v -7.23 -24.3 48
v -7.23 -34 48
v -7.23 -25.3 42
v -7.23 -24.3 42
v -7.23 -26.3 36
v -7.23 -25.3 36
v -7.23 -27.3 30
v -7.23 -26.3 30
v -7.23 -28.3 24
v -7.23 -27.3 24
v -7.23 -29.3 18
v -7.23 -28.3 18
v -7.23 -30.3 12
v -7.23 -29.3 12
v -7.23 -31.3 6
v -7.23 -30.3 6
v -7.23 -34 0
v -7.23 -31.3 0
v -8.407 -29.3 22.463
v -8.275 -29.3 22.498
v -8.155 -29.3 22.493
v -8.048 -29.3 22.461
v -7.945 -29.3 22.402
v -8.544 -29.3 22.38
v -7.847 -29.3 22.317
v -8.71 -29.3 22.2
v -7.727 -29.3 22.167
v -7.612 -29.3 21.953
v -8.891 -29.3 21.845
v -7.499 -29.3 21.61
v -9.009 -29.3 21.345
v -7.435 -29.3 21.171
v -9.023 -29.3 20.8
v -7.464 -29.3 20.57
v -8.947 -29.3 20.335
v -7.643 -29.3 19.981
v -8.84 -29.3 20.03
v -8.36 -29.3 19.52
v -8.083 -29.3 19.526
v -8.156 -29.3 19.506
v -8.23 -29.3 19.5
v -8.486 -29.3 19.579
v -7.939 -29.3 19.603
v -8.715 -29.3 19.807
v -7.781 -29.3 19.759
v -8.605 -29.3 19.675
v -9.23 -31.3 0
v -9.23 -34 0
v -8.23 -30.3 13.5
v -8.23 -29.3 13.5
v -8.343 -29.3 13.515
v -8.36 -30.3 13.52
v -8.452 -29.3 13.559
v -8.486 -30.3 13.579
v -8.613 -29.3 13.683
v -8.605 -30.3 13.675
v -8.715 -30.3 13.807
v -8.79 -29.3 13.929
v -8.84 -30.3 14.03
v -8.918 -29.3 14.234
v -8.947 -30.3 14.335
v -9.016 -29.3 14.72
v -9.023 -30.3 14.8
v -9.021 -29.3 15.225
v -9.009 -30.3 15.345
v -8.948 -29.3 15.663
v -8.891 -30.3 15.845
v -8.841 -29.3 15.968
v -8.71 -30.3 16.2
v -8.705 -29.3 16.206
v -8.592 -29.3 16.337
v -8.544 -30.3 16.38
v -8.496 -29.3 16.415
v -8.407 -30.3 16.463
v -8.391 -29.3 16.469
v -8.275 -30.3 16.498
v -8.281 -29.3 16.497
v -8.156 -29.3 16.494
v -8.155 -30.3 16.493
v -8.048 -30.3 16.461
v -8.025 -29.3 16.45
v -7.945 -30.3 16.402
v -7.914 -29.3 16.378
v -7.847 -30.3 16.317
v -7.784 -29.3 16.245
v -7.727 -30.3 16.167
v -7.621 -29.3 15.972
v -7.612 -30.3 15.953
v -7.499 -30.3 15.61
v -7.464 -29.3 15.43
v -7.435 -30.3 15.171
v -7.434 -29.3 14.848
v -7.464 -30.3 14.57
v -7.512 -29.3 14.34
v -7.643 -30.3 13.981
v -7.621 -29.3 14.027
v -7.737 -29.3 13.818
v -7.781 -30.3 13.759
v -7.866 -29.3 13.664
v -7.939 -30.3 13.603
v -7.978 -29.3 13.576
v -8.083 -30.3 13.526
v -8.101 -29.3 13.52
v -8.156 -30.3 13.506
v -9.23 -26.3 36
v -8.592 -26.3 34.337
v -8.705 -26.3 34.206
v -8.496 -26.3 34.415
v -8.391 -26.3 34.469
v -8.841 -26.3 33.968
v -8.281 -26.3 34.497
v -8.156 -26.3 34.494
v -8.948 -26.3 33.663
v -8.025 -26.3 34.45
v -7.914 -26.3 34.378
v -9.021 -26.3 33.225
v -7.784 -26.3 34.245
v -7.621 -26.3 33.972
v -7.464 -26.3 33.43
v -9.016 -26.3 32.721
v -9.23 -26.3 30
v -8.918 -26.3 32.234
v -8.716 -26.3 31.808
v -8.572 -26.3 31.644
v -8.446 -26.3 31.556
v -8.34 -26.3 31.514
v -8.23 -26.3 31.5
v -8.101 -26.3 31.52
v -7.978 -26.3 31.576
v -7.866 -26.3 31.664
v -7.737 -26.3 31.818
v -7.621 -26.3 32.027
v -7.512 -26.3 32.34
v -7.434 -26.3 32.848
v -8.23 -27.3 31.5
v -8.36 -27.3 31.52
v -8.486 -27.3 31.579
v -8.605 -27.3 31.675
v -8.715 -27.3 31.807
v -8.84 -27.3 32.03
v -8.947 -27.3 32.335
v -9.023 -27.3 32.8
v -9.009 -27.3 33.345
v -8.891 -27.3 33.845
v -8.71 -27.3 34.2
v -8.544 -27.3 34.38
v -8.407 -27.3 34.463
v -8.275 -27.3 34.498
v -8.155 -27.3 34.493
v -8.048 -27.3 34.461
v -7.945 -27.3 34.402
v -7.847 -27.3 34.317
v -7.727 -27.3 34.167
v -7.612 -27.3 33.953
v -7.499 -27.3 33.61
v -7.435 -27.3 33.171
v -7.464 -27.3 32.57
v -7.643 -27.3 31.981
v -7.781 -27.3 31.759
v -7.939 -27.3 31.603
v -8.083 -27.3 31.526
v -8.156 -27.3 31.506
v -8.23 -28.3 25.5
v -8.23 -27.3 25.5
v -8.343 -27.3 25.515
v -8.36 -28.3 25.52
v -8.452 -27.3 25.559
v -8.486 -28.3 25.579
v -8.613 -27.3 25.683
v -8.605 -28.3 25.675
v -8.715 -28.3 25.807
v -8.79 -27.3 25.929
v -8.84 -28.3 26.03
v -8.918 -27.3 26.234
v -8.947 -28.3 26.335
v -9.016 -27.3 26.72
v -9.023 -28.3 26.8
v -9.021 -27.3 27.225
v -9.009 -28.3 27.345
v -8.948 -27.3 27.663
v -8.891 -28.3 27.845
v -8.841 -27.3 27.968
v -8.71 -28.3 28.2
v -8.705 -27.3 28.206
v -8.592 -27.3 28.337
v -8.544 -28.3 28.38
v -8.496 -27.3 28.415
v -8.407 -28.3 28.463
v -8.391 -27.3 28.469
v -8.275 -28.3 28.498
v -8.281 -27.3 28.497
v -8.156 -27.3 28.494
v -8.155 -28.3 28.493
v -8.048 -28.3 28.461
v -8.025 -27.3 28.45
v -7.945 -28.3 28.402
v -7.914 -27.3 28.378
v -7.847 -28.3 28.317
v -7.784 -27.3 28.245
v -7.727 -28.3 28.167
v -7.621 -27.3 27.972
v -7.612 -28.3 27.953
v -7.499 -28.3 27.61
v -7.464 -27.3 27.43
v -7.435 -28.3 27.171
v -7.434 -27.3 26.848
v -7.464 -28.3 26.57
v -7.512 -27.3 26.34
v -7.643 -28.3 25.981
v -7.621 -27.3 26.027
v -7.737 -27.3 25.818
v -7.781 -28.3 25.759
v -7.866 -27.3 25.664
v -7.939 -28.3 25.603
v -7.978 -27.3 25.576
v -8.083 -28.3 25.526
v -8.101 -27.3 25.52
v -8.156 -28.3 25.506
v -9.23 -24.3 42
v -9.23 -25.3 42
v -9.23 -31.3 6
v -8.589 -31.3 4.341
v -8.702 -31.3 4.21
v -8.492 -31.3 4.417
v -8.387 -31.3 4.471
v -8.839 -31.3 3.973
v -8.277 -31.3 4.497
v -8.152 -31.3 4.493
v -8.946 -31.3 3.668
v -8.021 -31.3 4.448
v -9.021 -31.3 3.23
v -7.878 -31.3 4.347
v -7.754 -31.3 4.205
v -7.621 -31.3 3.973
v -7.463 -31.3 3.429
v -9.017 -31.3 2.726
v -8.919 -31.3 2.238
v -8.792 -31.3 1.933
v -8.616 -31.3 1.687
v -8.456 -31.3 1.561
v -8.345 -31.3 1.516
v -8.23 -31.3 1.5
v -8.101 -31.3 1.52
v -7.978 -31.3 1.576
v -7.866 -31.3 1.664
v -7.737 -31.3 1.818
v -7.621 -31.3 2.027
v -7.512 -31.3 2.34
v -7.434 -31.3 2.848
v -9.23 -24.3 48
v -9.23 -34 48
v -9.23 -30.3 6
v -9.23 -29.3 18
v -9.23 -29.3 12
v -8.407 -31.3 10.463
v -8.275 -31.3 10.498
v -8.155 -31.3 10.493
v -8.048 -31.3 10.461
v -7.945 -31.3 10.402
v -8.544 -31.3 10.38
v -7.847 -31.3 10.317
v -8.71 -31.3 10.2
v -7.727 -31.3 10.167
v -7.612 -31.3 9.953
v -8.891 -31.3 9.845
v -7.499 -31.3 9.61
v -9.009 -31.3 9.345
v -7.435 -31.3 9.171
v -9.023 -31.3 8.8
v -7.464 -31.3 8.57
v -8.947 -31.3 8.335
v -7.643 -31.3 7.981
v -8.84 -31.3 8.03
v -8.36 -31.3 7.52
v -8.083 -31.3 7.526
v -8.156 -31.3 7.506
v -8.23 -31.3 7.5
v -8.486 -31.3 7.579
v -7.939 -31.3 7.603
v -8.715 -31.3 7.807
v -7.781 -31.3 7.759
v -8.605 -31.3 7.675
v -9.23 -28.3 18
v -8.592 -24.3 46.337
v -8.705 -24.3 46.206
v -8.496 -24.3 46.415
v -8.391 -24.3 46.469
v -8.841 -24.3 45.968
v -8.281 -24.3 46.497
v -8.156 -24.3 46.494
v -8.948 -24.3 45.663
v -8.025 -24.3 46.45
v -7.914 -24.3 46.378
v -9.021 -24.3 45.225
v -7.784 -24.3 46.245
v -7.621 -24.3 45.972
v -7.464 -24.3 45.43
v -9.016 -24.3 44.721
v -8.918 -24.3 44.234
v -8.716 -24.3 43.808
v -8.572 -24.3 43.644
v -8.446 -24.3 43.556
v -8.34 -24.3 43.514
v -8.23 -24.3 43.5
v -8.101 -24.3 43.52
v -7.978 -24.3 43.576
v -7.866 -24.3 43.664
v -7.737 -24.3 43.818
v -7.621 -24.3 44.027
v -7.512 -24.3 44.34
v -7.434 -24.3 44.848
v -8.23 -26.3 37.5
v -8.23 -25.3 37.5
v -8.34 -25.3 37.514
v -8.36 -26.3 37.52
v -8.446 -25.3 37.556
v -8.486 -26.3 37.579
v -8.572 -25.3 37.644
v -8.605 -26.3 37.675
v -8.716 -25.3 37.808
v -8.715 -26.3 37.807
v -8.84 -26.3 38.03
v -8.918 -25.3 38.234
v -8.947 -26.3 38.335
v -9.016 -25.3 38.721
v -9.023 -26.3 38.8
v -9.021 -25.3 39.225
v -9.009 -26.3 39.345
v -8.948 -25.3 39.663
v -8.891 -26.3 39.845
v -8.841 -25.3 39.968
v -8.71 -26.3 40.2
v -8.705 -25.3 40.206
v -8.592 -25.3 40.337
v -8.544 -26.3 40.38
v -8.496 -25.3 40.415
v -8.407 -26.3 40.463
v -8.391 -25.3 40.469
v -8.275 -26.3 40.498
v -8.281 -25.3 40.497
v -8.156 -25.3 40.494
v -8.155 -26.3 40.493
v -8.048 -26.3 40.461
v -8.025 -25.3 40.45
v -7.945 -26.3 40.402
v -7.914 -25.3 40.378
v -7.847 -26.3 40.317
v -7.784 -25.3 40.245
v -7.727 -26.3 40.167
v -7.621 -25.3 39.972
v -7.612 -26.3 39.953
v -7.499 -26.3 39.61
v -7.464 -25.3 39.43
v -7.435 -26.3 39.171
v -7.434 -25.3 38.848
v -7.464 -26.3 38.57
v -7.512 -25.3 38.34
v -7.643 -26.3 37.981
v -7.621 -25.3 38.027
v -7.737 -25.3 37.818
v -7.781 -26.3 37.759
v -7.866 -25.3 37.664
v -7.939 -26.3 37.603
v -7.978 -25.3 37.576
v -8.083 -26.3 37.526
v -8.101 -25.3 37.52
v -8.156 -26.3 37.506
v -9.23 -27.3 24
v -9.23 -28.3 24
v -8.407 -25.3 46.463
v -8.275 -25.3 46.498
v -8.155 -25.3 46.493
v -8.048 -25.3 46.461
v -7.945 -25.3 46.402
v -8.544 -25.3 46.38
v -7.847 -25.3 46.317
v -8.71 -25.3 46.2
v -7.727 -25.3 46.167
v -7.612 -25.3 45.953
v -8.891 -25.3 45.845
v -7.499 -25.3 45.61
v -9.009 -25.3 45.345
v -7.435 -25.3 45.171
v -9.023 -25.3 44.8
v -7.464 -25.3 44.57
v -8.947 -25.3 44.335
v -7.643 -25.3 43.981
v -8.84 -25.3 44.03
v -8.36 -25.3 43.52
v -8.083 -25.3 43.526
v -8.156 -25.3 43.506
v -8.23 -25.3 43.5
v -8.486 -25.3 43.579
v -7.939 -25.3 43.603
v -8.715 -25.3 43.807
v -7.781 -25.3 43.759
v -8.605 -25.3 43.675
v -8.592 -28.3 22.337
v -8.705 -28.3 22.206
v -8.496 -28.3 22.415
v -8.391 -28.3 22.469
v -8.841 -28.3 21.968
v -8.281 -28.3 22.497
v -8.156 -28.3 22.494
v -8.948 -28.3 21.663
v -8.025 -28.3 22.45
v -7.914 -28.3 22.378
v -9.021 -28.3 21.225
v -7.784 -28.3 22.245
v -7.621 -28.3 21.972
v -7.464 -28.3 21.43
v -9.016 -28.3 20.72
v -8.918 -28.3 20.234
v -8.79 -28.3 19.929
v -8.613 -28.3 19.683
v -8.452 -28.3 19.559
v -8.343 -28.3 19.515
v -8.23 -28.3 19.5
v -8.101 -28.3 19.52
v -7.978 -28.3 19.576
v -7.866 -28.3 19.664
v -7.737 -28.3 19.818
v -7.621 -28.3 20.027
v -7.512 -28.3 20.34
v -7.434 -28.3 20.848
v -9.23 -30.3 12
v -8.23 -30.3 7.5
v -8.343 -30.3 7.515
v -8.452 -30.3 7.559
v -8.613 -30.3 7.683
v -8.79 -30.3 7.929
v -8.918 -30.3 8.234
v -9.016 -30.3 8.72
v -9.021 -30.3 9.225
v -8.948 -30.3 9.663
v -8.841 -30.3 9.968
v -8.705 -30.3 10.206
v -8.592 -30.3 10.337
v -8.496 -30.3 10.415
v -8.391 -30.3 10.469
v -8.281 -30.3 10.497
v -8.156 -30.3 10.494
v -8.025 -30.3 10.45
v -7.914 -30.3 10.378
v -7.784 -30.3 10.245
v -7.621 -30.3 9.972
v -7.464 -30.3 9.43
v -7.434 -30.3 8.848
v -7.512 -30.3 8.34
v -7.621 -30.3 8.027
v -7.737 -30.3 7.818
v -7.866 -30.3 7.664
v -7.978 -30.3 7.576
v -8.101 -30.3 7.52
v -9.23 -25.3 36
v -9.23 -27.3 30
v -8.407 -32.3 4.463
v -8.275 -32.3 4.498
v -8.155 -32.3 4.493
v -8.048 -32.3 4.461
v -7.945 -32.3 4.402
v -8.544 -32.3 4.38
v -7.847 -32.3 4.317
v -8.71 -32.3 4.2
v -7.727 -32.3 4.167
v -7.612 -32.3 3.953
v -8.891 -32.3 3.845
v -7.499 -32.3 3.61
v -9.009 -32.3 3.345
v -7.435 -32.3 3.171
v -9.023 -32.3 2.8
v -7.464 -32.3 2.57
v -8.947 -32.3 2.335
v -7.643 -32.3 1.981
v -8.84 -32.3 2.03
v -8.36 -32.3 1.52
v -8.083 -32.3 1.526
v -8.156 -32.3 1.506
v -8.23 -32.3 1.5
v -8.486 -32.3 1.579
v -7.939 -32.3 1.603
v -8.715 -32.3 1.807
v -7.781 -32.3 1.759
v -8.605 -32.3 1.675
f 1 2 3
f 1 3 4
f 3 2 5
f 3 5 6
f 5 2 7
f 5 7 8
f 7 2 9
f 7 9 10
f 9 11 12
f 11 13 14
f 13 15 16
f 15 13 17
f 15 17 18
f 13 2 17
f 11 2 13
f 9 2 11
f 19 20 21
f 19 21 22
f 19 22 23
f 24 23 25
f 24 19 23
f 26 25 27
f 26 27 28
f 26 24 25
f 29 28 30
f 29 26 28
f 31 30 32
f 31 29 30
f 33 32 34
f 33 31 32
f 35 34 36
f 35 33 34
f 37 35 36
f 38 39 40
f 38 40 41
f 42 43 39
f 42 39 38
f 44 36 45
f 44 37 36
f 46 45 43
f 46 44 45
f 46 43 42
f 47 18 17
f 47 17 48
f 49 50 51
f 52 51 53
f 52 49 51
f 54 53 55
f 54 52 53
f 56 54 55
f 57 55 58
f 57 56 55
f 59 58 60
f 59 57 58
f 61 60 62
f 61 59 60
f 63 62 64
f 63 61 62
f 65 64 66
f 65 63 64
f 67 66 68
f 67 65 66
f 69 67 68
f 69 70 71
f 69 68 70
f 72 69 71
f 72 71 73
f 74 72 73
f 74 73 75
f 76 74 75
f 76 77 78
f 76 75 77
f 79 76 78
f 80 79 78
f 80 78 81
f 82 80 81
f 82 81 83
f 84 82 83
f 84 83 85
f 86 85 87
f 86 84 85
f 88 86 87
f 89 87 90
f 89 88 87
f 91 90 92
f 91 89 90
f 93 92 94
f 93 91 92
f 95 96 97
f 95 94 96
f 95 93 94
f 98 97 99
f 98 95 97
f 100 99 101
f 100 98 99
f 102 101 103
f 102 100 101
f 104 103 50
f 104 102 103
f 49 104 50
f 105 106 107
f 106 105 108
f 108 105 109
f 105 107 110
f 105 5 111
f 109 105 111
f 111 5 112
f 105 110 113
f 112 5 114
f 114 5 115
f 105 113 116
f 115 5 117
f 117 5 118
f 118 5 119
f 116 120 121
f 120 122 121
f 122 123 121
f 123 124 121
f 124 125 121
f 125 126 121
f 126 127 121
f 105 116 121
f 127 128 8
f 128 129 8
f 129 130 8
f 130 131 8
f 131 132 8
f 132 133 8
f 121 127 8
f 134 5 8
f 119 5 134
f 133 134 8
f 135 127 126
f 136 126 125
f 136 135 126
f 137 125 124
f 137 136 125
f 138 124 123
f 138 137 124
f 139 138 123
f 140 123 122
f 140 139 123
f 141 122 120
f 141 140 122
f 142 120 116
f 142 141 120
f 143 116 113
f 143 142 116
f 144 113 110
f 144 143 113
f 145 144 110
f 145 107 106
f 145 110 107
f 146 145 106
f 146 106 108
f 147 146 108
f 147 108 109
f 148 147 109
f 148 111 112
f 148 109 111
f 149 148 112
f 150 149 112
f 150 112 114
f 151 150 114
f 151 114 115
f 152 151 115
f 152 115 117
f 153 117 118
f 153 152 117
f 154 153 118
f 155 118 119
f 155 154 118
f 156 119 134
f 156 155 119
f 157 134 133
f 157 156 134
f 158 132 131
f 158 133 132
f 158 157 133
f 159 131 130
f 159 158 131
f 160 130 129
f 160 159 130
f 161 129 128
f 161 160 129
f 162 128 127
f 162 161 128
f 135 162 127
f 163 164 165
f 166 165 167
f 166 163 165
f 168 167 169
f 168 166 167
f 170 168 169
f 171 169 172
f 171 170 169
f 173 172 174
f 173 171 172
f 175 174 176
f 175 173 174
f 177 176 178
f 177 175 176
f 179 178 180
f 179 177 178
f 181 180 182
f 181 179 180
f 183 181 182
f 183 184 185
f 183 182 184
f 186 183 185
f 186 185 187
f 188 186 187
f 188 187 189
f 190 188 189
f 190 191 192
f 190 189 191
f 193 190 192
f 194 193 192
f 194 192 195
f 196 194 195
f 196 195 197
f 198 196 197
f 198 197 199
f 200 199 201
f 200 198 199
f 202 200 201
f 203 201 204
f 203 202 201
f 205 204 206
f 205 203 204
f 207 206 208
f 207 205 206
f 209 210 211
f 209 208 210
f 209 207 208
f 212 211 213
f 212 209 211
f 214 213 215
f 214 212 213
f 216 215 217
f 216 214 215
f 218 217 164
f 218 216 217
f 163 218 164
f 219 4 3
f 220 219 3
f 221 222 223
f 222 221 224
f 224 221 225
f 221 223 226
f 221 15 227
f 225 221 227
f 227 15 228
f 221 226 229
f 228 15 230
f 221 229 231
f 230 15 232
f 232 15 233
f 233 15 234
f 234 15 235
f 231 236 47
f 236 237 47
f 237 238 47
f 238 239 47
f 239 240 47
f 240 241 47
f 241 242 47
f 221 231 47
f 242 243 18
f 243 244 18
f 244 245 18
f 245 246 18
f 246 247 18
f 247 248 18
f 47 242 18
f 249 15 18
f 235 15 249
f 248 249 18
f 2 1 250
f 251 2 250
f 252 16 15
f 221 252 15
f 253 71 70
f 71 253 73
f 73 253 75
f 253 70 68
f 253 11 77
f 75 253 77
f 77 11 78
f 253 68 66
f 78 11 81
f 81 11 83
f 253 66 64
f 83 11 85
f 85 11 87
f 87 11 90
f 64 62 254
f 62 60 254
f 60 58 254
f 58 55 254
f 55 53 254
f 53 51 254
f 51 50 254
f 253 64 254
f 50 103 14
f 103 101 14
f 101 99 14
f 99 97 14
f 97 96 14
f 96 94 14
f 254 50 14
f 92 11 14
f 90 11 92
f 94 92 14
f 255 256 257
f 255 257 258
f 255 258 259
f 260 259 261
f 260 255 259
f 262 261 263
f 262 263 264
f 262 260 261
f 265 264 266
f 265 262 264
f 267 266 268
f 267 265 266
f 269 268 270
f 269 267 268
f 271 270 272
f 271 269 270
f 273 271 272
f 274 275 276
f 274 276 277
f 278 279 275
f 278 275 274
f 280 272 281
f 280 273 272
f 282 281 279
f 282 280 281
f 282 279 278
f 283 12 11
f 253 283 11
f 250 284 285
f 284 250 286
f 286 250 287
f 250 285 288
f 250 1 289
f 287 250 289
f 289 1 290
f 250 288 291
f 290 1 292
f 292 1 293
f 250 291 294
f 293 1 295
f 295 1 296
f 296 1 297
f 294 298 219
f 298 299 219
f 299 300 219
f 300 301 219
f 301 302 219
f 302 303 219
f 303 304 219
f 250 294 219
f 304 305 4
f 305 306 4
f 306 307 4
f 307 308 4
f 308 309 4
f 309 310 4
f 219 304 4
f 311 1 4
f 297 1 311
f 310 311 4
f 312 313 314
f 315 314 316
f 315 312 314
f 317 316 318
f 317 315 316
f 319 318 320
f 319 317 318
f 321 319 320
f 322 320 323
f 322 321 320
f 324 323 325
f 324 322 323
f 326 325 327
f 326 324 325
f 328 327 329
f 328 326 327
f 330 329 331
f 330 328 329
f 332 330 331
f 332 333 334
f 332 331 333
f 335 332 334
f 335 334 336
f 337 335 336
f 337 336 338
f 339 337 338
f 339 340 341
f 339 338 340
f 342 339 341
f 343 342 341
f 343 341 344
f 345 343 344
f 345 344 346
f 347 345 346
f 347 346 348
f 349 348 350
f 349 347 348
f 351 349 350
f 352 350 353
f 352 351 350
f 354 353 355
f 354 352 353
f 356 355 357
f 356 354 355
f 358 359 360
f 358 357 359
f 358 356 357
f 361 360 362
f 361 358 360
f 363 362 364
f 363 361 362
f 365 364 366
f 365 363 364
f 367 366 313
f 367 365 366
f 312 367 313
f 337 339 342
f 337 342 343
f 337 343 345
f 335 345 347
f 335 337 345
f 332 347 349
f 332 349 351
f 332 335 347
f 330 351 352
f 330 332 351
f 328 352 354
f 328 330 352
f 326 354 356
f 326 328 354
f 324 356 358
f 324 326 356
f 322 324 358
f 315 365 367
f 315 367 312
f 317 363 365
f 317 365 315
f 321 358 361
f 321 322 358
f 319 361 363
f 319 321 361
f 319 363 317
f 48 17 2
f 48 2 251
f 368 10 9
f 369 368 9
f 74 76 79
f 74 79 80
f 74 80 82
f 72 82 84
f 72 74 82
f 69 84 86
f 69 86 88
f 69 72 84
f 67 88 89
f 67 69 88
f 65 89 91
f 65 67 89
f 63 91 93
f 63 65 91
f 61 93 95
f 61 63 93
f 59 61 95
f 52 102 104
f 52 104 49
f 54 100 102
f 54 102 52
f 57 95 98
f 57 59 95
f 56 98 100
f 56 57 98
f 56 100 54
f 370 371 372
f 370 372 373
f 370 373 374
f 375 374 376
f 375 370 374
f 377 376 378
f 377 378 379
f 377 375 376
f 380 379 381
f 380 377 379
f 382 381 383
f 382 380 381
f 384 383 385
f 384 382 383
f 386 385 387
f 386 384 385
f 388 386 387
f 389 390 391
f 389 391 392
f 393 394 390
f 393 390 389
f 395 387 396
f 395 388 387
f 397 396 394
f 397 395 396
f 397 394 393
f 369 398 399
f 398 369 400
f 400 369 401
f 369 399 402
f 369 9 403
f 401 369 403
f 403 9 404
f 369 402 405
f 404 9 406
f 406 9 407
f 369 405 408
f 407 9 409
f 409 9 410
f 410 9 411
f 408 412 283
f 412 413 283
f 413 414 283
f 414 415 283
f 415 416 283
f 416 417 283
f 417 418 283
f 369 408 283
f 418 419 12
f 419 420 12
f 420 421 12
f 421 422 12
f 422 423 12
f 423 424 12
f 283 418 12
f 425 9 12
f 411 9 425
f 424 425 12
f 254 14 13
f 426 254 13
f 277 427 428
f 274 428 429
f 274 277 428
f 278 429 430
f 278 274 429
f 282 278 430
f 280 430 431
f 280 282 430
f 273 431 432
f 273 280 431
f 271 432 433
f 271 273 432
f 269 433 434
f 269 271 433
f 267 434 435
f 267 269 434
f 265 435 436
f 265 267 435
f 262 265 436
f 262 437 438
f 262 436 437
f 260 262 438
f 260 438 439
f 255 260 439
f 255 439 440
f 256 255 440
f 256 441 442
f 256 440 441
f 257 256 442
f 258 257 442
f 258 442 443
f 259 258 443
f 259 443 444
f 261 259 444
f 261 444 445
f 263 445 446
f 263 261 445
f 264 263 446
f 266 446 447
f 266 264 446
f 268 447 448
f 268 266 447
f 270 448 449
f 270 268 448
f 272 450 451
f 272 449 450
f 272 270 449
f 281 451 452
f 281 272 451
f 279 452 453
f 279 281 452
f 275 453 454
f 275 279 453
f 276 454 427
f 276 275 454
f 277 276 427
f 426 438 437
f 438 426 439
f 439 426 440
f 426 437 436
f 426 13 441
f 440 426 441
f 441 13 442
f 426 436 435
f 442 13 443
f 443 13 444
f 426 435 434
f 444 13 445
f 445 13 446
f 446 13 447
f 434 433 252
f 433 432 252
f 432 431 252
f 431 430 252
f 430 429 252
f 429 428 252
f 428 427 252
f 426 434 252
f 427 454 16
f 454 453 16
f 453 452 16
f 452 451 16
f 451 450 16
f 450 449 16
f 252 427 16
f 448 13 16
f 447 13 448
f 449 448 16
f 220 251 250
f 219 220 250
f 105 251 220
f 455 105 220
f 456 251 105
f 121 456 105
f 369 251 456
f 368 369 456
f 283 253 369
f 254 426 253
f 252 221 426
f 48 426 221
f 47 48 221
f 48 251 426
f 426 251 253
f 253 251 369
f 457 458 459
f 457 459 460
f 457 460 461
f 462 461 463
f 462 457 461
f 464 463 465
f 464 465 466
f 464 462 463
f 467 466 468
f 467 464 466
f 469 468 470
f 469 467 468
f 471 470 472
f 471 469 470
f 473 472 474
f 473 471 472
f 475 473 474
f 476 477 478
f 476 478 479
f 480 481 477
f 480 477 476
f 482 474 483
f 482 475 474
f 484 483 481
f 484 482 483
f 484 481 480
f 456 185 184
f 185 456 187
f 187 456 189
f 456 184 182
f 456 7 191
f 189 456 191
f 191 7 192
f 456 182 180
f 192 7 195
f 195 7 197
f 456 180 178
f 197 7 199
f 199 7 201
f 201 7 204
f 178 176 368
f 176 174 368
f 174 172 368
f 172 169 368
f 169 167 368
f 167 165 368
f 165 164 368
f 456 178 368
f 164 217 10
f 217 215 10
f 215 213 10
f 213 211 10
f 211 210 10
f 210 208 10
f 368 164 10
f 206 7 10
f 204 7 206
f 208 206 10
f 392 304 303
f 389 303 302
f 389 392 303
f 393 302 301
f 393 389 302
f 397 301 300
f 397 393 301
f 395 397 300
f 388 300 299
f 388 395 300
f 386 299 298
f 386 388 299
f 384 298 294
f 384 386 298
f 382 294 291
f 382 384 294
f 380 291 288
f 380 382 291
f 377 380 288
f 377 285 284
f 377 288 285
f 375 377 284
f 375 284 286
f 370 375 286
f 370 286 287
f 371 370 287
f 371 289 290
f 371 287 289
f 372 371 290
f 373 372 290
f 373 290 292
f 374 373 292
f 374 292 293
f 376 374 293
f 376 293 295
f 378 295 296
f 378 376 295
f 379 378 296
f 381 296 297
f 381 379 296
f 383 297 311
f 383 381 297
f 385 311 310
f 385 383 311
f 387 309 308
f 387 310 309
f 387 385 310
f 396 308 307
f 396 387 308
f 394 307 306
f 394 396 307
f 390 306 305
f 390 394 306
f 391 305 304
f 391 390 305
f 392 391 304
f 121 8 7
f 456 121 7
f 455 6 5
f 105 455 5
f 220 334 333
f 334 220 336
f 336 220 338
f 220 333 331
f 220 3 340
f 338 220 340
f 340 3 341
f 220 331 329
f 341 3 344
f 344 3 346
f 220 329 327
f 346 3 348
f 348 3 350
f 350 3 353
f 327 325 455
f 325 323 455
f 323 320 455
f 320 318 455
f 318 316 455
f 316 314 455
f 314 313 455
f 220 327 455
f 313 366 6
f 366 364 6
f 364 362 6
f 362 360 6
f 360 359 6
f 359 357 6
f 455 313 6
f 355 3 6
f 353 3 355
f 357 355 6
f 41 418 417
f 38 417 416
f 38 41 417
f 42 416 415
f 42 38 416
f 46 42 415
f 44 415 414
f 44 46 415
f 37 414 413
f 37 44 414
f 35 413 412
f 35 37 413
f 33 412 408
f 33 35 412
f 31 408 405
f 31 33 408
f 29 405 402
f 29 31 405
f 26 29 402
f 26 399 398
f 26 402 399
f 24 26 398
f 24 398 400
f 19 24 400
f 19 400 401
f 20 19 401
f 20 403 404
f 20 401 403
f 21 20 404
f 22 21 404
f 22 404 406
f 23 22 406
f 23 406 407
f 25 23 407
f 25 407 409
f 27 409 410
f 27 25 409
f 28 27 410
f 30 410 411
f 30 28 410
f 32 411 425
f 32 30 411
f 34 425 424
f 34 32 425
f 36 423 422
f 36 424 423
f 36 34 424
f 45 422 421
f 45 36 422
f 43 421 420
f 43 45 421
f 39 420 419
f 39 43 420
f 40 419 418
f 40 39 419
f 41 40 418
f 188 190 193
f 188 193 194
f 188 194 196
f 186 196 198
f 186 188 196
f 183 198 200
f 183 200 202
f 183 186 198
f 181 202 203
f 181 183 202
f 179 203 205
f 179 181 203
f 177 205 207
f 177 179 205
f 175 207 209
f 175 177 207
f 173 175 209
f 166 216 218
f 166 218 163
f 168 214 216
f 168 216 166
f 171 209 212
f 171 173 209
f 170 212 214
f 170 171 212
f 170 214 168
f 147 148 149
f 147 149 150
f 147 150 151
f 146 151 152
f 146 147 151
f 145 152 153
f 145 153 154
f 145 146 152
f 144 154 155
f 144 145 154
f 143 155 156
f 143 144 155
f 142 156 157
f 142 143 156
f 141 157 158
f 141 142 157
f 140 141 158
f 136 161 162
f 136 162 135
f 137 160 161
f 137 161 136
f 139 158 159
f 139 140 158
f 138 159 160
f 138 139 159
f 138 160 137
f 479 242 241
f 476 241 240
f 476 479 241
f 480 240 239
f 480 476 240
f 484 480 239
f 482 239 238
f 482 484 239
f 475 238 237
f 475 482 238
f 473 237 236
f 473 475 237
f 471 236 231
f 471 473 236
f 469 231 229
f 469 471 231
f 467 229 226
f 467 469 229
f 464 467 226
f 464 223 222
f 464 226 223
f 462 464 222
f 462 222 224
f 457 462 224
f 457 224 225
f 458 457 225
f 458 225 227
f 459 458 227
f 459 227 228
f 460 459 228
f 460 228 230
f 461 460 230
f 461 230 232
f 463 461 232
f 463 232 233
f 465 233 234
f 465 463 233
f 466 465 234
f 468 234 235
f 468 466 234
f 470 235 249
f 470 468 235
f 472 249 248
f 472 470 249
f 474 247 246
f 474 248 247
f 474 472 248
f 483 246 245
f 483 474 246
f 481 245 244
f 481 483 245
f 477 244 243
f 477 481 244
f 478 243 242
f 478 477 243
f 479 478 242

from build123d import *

# Parameters (mm, degrees)
BOSS_EXTRUDE1_DEPTH      = 48
CUT_EXTRUDE4_DEPTH       = 2
CUT_EXTRUDE6_DEPTH       = 9
CUT_EXTRUDE6_DEPTH_BACK  = 1
SKETCH8_RX               = 1.5
SKETCH8_RY               = 0.8
CUT_EXTRUDE7_DEPTH       = 11
CUT_EXTRUDE7_DEPTH_BACK  = 1
SKETCH13_RX              = 1.5
SKETCH13_RY              = 0.8
CUT_EXTRUDE8_DEPTH       = 13
CUT_EXTRUDE8_DEPTH_BACK  = 1
SKETCH14_RX              = 1.5
SKETCH14_RY              = 0.8
CUT_EXTRUDE9_DEPTH       = 15
CUT_EXTRUDE9_DEPTH_BACK  = 1
SKETCH15_RX              = 1.5
SKETCH15_RY              = 0.8
CUT_EXTRUDE10_DEPTH      = 17
CUT_EXTRUDE10_DEPTH_BACK = 1
SKETCH16_RX              = 1.5
SKETCH16_RY              = 0.8
CUT_EXTRUDE11_DEPTH      = 19
CUT_EXTRUDE11_DEPTH_BACK = 1
SKETCH17_RX              = 1.5
SKETCH17_RY              = 0.8
CUT_EXTRUDE12_DEPTH      = 21
CUT_EXTRUDE12_DEPTH_BACK = 1
SKETCH18_RX              = 1.5
SKETCH18_RY              = 0.8
CUT_EXTRUDE13_DEPTH      = 23
CUT_EXTRUDE13_DEPTH_BACK = 1
SKETCH19_RX              = 1.5
SKETCH19_RY              = 0.8
SKETCH20_W               = 61.407499633
SKETCH20_H               = 22.367478321
CUT_EXTRUDE14_DEPTH      = 10


with BuildPart() as part:
    # Sketch2 → Boss-Extrude1 (new body)
    with BuildSketch(Plane.XY):
        Polygon((-7.23, -20.3), (-7.23, -34), (-9.23, -34), (-9.23, -2), (-7.23, -2), align=None)
    extrude(amount=BOSS_EXTRUDE1_DEPTH)

    # Sketch7 → Cut-Extrude4 (cut)
    with BuildSketch(Plane(origin=(-7.23, 0, 0), x_dir=(0, 0, -1), z_dir=(1, 0, 0))):
        Polygon((-48, -16.3), (-48, -24.3), (-42, -24.3), (-42, -25.3), (-36, -25.3), (-36, -26.3), (-30, -26.3), (-30, -27.3), (-24, -27.3), (-24, -28.3), (-18, -28.3), (-18, -29.3), (-12, -29.3), (-12, -30.3), (-6, -30.3), (-6, -31.3), (0, -31.3), (0, -9.3), (-6, -9.3), (-6, -10.3), (-12, -10.3), (-12, -11.3), (-18, -11.3), (-18, -12.3), (-24, -12.3), (-24, -13.3), (-30, -13.3), (-30, -14.3), (-36, -14.3), (-36, -15.3), (-42, -15.3), (-42, -16.3), align=None)
    extrude(amount=-CUT_EXTRUDE4_DEPTH, mode=Mode.SUBTRACT)


with BuildPart() as cut_extrude4_piece_1:
    # of the separate pieces the step leaves, piece 1, a body of its own (cut_extrude4_pieces)
    add(part.part.solids().sort_by_distance((-7.23, -9.3, 0))[0])


with BuildPart() as cut_extrude4_piece_2:
    # of the separate pieces the step leaves, piece 2, a body of its own (cut_extrude4_pieces)
    add(part.part.solids().sort_by_distance((-7.23, -34, 0))[0])


with BuildPart() as cut_extrude6_tool:
    # Sketch8 → Cut-Extrude6 (new, two sides: drawn at the far end of the back side and taken through both)
    with BuildSketch(Plane(origin=(0, -24.3, 0), x_dir=(1, 0, 0), z_dir=(0, 1, 0)).offset(-CUT_EXTRUDE6_DEPTH_BACK)):
        with Locations(Location((-8.23, -45), (0, 0, 90))):
            Ellipse(SKETCH8_RX, SKETCH8_RY)
    extrude(amount=CUT_EXTRUDE6_DEPTH + CUT_EXTRUDE6_DEPTH_BACK)


with BuildPart() as cut_extrude4_piece_1_1:
    add(cut_extrude4_piece_1.part)

    # Cut-Extrude6: cut by cut_extrude6_tool
    add(cut_extrude6_tool.part, mode=Mode.SUBTRACT)


with BuildPart() as cut_extrude4_piece_2_1:
    add(cut_extrude4_piece_2.part)

    # Cut-Extrude6: cut by cut_extrude6_tool
    add(cut_extrude6_tool.part, mode=Mode.SUBTRACT)


with BuildPart() as cut_extrude7_tool:
    # Sketch13 → Cut-Extrude7 (new, two sides: drawn at the far end of the back side and taken through both)
    with BuildSketch(Plane(origin=(0, -25.3, 0), x_dir=(1, 0, 0), z_dir=(0, 1, 0)).offset(-CUT_EXTRUDE7_DEPTH_BACK)):
        with Locations(Location((-8.23, -39), (0, 0, 90))):
            Ellipse(SKETCH13_RX, SKETCH13_RY)
    extrude(amount=CUT_EXTRUDE7_DEPTH + CUT_EXTRUDE7_DEPTH_BACK)


with BuildPart() as cut_extrude4_piece_1_2:
    add(cut_extrude4_piece_1_1.part)

    # Cut-Extrude7: cut by cut_extrude7_tool
    add(cut_extrude7_tool.part, mode=Mode.SUBTRACT)


with BuildPart() as cut_extrude4_piece_2_2:
    add(cut_extrude4_piece_2_1.part)

    # Cut-Extrude7: cut by cut_extrude7_tool
    add(cut_extrude7_tool.part, mode=Mode.SUBTRACT)


with BuildPart() as cut_extrude8_tool:
    # Sketch14 → Cut-Extrude8 (new, two sides: drawn at the far end of the back side and taken through both)
    with BuildSketch(Plane(origin=(0, -26.3, 0), x_dir=(1, 0, 0), z_dir=(0, 1, 0)).offset(-CUT_EXTRUDE8_DEPTH_BACK)):
        with Locations(Location((-8.23, -33), (0, 0, 90))):
            Ellipse(SKETCH14_RX, SKETCH14_RY)
    extrude(amount=CUT_EXTRUDE8_DEPTH + CUT_EXTRUDE8_DEPTH_BACK)


with BuildPart() as cut_extrude4_piece_1_3:
    add(cut_extrude4_piece_1_2.part)

    # Cut-Extrude8: cut by cut_extrude8_tool
    add(cut_extrude8_tool.part, mode=Mode.SUBTRACT)


with BuildPart() as cut_extrude4_piece_2_3:
    add(cut_extrude4_piece_2_2.part)

    # Cut-Extrude8: cut by cut_extrude8_tool
    add(cut_extrude8_tool.part, mode=Mode.SUBTRACT)


with BuildPart() as cut_extrude9_tool:
    # Sketch15 → Cut-Extrude9 (new, two sides: drawn at the far end of the back side and taken through both)
    with BuildSketch(Plane(origin=(0, -27.3, 0), x_dir=(1, 0, 0), z_dir=(0, 1, 0)).offset(-CUT_EXTRUDE9_DEPTH_BACK)):
        with Locations(Location((-8.23, -27), (0, 0, 90))):
            Ellipse(SKETCH15_RX, SKETCH15_RY)
    extrude(amount=CUT_EXTRUDE9_DEPTH + CUT_EXTRUDE9_DEPTH_BACK)


with BuildPart() as cut_extrude4_piece_1_4:
    add(cut_extrude4_piece_1_3.part)

    # Cut-Extrude9: cut by cut_extrude9_tool
    add(cut_extrude9_tool.part, mode=Mode.SUBTRACT)


with BuildPart() as cut_extrude4_piece_2_4:
    add(cut_extrude4_piece_2_3.part)

    # Cut-Extrude9: cut by cut_extrude9_tool
    add(cut_extrude9_tool.part, mode=Mode.SUBTRACT)


with BuildPart() as cut_extrude10_tool:
    # Sketch16 → Cut-Extrude10 (new, two sides: drawn at the far end of the back side and taken through both)
    with BuildSketch(Plane(origin=(0, -28.3, 0), x_dir=(1, 0, 0), z_dir=(0, 1, 0)).offset(-CUT_EXTRUDE10_DEPTH_BACK)):
        with Locations(Location((-8.23, -21), (0, 0, 90))):
            Ellipse(SKETCH16_RX, SKETCH16_RY)
    extrude(amount=CUT_EXTRUDE10_DEPTH + CUT_EXTRUDE10_DEPTH_BACK)


with BuildPart() as cut_extrude4_piece_1_5:
    add(cut_extrude4_piece_1_4.part)

    # Cut-Extrude10: cut by cut_extrude10_tool
    add(cut_extrude10_tool.part, mode=Mode.SUBTRACT)


with BuildPart() as cut_extrude4_piece_2_5:
    add(cut_extrude4_piece_2_4.part)

    # Cut-Extrude10: cut by cut_extrude10_tool
    add(cut_extrude10_tool.part, mode=Mode.SUBTRACT)


with BuildPart() as cut_extrude11_tool:
    # Sketch17 → Cut-Extrude11 (new, two sides: drawn at the far end of the back side and taken through both)
    with BuildSketch(Plane(origin=(0, -29.3, 0), x_dir=(1, 0, 0), z_dir=(0, 1, 0)).offset(-CUT_EXTRUDE11_DEPTH_BACK)):
        with Locations(Location((-8.23, -15), (0, 0, 90))):
            Ellipse(SKETCH17_RX, SKETCH17_RY)
    extrude(amount=CUT_EXTRUDE11_DEPTH + CUT_EXTRUDE11_DEPTH_BACK)


with BuildPart() as cut_extrude4_piece_1_6:
    add(cut_extrude4_piece_1_5.part)

    # Cut-Extrude11: cut by cut_extrude11_tool
    add(cut_extrude11_tool.part, mode=Mode.SUBTRACT)


with BuildPart() as cut_extrude4_piece_2_6:
    add(cut_extrude4_piece_2_5.part)

    # Cut-Extrude11: cut by cut_extrude11_tool
    add(cut_extrude11_tool.part, mode=Mode.SUBTRACT)


with BuildPart() as cut_extrude12_tool:
    # Sketch18 → Cut-Extrude12 (new, two sides: drawn at the far end of the back side and taken through both)
    with BuildSketch(Plane(origin=(0, -30.3, 0), x_dir=(1, 0, 0), z_dir=(0, 1, 0)).offset(-CUT_EXTRUDE12_DEPTH_BACK)):
        with Locations(Location((-8.23, -9), (0, 0, 90))):
            Ellipse(SKETCH18_RX, SKETCH18_RY)
    extrude(amount=CUT_EXTRUDE12_DEPTH + CUT_EXTRUDE12_DEPTH_BACK)


with BuildPart() as cut_extrude4_piece_1_7:
    add(cut_extrude4_piece_1_6.part)

    # Cut-Extrude12: cut by cut_extrude12_tool
    add(cut_extrude12_tool.part, mode=Mode.SUBTRACT)


with BuildPart() as cut_extrude4_piece_2_7:
    add(cut_extrude4_piece_2_6.part)

    # Cut-Extrude12: cut by cut_extrude12_tool
    add(cut_extrude12_tool.part, mode=Mode.SUBTRACT)


with BuildPart() as cut_extrude13_tool:
    # Sketch19 → Cut-Extrude13 (new, two sides: drawn at the far end of the back side and taken through both)
    with BuildSketch(Plane(origin=(0, -31.3, 0), x_dir=(1, 0, 0), z_dir=(0, 1, 0)).offset(-CUT_EXTRUDE13_DEPTH_BACK)):
        with Locations(Location((-8.23, -3), (0, 0, 90))):
            Ellipse(SKETCH19_RX, SKETCH19_RY)
    extrude(amount=CUT_EXTRUDE13_DEPTH + CUT_EXTRUDE13_DEPTH_BACK)


with BuildPart() as cut_extrude4_piece_1_8:
    add(cut_extrude4_piece_1_7.part)

    # Cut-Extrude13: cut by cut_extrude13_tool
    add(cut_extrude13_tool.part, mode=Mode.SUBTRACT)

    # Sketch20 → Cut-Extrude14 (cut)
    with BuildSketch(Plane(origin=(0, 0, 0), x_dir=(0, 0, -1), z_dir=(1, 0, 0))):
        with Locations((-22.424003226, -10.633869098)):
            Rectangle(SKETCH20_W, SKETCH20_H)
    extrude(amount=-CUT_EXTRUDE14_DEPTH, mode=Mode.SUBTRACT)


with BuildPart() as cut_extrude4_piece_2_8:
    add(cut_extrude4_piece_2_7.part)

    # Cut-Extrude13: cut by cut_extrude13_tool
    add(cut_extrude13_tool.part, mode=Mode.SUBTRACT)


solid = cut_extrude4_piece_2_8.part
